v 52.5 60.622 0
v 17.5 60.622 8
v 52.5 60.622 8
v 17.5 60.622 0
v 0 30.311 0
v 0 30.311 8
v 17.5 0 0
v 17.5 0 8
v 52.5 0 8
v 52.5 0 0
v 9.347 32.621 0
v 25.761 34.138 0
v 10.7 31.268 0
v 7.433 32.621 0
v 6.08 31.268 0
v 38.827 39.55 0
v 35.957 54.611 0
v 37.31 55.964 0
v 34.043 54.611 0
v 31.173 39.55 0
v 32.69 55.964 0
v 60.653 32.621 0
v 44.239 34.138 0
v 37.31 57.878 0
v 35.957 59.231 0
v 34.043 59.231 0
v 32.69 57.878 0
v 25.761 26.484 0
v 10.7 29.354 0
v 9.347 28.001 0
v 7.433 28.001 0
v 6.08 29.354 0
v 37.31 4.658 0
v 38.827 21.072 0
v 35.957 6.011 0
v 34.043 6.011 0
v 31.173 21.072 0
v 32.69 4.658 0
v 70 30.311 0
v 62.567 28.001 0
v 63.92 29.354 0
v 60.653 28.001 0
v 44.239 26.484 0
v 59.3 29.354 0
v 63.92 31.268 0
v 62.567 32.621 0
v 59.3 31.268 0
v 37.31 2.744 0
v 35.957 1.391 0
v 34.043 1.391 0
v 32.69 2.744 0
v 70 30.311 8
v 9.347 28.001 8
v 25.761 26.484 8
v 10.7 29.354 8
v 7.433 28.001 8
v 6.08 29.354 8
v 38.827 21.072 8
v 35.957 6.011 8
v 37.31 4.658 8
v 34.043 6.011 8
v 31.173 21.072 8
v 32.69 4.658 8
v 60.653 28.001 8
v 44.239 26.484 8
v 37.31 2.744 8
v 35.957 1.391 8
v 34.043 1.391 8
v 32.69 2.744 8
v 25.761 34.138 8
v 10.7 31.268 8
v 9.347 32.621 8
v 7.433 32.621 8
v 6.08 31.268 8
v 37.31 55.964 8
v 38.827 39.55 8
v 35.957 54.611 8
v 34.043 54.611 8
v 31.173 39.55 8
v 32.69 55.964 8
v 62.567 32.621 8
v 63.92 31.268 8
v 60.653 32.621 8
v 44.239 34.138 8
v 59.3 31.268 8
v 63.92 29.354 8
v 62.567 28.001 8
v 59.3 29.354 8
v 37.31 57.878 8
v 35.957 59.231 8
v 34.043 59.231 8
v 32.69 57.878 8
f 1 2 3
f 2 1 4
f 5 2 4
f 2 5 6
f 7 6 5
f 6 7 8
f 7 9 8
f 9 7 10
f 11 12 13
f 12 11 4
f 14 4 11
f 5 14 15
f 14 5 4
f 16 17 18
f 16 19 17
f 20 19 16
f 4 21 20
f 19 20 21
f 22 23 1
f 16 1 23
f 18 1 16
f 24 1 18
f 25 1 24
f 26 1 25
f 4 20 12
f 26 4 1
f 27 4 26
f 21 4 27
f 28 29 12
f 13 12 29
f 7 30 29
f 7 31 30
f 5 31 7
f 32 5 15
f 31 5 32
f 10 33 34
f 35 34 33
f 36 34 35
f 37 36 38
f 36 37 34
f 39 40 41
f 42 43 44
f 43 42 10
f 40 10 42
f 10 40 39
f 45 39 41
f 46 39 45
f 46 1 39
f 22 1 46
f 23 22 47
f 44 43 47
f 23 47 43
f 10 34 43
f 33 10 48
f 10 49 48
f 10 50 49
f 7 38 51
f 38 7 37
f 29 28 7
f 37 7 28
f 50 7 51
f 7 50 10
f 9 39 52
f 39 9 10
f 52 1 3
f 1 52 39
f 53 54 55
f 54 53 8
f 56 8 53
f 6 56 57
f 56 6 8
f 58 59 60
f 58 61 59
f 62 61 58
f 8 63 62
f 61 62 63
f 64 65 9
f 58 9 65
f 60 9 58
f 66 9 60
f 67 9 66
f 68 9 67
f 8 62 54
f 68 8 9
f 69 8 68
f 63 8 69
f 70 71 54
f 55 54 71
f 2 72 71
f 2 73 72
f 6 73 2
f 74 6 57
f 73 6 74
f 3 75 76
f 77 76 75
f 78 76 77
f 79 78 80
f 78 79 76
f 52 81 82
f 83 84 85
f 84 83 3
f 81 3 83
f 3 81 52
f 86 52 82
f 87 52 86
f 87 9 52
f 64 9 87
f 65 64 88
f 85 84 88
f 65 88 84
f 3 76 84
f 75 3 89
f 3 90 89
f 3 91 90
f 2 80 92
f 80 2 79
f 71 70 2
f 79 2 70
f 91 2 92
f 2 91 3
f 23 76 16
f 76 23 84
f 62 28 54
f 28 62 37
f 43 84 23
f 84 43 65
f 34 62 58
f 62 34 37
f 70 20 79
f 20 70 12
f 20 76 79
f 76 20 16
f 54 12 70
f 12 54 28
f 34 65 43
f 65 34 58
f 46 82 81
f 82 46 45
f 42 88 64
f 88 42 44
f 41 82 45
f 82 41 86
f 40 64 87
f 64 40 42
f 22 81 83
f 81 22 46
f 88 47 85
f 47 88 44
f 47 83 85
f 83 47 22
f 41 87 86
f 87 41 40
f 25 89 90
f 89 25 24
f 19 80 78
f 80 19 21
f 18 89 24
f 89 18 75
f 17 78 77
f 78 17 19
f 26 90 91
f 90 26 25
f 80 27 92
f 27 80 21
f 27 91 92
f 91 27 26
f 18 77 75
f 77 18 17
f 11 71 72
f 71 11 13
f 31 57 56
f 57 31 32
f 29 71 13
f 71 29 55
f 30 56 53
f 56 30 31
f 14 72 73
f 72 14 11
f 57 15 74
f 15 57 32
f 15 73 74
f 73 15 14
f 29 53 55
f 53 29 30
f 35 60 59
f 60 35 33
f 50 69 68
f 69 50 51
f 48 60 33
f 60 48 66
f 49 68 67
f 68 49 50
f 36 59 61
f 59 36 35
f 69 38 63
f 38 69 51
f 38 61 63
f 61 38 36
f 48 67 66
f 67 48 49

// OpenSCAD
$fn = 32;

// ----------------------------------------------------------------------
// Polygon plate: 6-gon R35, 4 bolt windows
// ----------------------------------------------------------------------

// --- parameters (mm) ---
sides = 6;                // number of polygon sides
plate_r = 35;             // circumscribed radius of the polygon
bore_r = 10;              // centre bore radius
bolts = 4;                // number of bolt windows
ring_r = 26.61;           // bolt-circle radius
bolt_r = 2.5;             // bolt window radius
plate_t = 8;              // plate thickness, Z (extrusion height)

plate_d = 2 * plate_r;  // circumscribed diameter
bore_d = 2 * bore_r;  // centre bore diameter
bolt_d = 2 * bolt_r;  // bolt window diameter
ring_d = 2 * ring_r;  // bolt-circle diameter

profile = [[70, 30.311], [52.5, 60.622], [17.5, 60.622], [0, 30.311], [17.5, 0], [52.5, 0]];  // primary outline, 6 points, counter clockwise
void_1 = [[44.239, 34.138], [38.827, 39.55], [31.173, 39.55], [25.761, 34.138], [25.761, 26.484], [31.173, 21.072], [38.827, 21.072], [44.239, 26.484]];  // centre bore, 8 points
void_2 = [[63.92, 31.268], [62.567, 32.621], [60.653, 32.621], [59.3, 31.268], [59.3, 29.354], [60.653, 28.001], [62.567, 28.001], [63.92, 29.354]];  // bolt window 1, 8 points
void_3 = [[37.31, 57.878], [35.957, 59.231], [34.043, 59.231], [32.69, 57.878], [32.69, 55.964], [34.043, 54.611], [35.957, 54.611], [37.31, 55.964]];  // bolt window 2, 8 points
void_4 = [[10.7, 31.268], [9.347, 32.621], [7.433, 32.621], [6.08, 31.268], [6.08, 29.354], [7.433, 28.001], [9.347, 28.001], [10.7, 29.354]];  // bolt window 3, 8 points
void_5 = [[37.31, 4.658], [35.957, 6.011], [34.043, 6.011], [32.69, 4.658], [32.69, 2.744], [34.043, 1.391], [35.957, 1.391], [37.31, 2.744]];  // bolt window 4, 8 points

// --- the one profile operation ---
difference() {
  linear_extrude(height = plate_t) polygon(points = profile);
  translate([0, 0, -1])
    linear_extrude(height = plate_t + 2) polygon(points = void_1);
  translate([0, 0, -1])
    linear_extrude(height = plate_t + 2) polygon(points = void_2);
  translate([0, 0, -1])
    linear_extrude(height = plate_t + 2) polygon(points = void_3);
  translate([0, 0, -1])
    linear_extrude(height = plate_t + 2) polygon(points = void_4);
  translate([0, 0, -1])
    linear_extrude(height = plate_t + 2) polygon(points = void_5);
}
